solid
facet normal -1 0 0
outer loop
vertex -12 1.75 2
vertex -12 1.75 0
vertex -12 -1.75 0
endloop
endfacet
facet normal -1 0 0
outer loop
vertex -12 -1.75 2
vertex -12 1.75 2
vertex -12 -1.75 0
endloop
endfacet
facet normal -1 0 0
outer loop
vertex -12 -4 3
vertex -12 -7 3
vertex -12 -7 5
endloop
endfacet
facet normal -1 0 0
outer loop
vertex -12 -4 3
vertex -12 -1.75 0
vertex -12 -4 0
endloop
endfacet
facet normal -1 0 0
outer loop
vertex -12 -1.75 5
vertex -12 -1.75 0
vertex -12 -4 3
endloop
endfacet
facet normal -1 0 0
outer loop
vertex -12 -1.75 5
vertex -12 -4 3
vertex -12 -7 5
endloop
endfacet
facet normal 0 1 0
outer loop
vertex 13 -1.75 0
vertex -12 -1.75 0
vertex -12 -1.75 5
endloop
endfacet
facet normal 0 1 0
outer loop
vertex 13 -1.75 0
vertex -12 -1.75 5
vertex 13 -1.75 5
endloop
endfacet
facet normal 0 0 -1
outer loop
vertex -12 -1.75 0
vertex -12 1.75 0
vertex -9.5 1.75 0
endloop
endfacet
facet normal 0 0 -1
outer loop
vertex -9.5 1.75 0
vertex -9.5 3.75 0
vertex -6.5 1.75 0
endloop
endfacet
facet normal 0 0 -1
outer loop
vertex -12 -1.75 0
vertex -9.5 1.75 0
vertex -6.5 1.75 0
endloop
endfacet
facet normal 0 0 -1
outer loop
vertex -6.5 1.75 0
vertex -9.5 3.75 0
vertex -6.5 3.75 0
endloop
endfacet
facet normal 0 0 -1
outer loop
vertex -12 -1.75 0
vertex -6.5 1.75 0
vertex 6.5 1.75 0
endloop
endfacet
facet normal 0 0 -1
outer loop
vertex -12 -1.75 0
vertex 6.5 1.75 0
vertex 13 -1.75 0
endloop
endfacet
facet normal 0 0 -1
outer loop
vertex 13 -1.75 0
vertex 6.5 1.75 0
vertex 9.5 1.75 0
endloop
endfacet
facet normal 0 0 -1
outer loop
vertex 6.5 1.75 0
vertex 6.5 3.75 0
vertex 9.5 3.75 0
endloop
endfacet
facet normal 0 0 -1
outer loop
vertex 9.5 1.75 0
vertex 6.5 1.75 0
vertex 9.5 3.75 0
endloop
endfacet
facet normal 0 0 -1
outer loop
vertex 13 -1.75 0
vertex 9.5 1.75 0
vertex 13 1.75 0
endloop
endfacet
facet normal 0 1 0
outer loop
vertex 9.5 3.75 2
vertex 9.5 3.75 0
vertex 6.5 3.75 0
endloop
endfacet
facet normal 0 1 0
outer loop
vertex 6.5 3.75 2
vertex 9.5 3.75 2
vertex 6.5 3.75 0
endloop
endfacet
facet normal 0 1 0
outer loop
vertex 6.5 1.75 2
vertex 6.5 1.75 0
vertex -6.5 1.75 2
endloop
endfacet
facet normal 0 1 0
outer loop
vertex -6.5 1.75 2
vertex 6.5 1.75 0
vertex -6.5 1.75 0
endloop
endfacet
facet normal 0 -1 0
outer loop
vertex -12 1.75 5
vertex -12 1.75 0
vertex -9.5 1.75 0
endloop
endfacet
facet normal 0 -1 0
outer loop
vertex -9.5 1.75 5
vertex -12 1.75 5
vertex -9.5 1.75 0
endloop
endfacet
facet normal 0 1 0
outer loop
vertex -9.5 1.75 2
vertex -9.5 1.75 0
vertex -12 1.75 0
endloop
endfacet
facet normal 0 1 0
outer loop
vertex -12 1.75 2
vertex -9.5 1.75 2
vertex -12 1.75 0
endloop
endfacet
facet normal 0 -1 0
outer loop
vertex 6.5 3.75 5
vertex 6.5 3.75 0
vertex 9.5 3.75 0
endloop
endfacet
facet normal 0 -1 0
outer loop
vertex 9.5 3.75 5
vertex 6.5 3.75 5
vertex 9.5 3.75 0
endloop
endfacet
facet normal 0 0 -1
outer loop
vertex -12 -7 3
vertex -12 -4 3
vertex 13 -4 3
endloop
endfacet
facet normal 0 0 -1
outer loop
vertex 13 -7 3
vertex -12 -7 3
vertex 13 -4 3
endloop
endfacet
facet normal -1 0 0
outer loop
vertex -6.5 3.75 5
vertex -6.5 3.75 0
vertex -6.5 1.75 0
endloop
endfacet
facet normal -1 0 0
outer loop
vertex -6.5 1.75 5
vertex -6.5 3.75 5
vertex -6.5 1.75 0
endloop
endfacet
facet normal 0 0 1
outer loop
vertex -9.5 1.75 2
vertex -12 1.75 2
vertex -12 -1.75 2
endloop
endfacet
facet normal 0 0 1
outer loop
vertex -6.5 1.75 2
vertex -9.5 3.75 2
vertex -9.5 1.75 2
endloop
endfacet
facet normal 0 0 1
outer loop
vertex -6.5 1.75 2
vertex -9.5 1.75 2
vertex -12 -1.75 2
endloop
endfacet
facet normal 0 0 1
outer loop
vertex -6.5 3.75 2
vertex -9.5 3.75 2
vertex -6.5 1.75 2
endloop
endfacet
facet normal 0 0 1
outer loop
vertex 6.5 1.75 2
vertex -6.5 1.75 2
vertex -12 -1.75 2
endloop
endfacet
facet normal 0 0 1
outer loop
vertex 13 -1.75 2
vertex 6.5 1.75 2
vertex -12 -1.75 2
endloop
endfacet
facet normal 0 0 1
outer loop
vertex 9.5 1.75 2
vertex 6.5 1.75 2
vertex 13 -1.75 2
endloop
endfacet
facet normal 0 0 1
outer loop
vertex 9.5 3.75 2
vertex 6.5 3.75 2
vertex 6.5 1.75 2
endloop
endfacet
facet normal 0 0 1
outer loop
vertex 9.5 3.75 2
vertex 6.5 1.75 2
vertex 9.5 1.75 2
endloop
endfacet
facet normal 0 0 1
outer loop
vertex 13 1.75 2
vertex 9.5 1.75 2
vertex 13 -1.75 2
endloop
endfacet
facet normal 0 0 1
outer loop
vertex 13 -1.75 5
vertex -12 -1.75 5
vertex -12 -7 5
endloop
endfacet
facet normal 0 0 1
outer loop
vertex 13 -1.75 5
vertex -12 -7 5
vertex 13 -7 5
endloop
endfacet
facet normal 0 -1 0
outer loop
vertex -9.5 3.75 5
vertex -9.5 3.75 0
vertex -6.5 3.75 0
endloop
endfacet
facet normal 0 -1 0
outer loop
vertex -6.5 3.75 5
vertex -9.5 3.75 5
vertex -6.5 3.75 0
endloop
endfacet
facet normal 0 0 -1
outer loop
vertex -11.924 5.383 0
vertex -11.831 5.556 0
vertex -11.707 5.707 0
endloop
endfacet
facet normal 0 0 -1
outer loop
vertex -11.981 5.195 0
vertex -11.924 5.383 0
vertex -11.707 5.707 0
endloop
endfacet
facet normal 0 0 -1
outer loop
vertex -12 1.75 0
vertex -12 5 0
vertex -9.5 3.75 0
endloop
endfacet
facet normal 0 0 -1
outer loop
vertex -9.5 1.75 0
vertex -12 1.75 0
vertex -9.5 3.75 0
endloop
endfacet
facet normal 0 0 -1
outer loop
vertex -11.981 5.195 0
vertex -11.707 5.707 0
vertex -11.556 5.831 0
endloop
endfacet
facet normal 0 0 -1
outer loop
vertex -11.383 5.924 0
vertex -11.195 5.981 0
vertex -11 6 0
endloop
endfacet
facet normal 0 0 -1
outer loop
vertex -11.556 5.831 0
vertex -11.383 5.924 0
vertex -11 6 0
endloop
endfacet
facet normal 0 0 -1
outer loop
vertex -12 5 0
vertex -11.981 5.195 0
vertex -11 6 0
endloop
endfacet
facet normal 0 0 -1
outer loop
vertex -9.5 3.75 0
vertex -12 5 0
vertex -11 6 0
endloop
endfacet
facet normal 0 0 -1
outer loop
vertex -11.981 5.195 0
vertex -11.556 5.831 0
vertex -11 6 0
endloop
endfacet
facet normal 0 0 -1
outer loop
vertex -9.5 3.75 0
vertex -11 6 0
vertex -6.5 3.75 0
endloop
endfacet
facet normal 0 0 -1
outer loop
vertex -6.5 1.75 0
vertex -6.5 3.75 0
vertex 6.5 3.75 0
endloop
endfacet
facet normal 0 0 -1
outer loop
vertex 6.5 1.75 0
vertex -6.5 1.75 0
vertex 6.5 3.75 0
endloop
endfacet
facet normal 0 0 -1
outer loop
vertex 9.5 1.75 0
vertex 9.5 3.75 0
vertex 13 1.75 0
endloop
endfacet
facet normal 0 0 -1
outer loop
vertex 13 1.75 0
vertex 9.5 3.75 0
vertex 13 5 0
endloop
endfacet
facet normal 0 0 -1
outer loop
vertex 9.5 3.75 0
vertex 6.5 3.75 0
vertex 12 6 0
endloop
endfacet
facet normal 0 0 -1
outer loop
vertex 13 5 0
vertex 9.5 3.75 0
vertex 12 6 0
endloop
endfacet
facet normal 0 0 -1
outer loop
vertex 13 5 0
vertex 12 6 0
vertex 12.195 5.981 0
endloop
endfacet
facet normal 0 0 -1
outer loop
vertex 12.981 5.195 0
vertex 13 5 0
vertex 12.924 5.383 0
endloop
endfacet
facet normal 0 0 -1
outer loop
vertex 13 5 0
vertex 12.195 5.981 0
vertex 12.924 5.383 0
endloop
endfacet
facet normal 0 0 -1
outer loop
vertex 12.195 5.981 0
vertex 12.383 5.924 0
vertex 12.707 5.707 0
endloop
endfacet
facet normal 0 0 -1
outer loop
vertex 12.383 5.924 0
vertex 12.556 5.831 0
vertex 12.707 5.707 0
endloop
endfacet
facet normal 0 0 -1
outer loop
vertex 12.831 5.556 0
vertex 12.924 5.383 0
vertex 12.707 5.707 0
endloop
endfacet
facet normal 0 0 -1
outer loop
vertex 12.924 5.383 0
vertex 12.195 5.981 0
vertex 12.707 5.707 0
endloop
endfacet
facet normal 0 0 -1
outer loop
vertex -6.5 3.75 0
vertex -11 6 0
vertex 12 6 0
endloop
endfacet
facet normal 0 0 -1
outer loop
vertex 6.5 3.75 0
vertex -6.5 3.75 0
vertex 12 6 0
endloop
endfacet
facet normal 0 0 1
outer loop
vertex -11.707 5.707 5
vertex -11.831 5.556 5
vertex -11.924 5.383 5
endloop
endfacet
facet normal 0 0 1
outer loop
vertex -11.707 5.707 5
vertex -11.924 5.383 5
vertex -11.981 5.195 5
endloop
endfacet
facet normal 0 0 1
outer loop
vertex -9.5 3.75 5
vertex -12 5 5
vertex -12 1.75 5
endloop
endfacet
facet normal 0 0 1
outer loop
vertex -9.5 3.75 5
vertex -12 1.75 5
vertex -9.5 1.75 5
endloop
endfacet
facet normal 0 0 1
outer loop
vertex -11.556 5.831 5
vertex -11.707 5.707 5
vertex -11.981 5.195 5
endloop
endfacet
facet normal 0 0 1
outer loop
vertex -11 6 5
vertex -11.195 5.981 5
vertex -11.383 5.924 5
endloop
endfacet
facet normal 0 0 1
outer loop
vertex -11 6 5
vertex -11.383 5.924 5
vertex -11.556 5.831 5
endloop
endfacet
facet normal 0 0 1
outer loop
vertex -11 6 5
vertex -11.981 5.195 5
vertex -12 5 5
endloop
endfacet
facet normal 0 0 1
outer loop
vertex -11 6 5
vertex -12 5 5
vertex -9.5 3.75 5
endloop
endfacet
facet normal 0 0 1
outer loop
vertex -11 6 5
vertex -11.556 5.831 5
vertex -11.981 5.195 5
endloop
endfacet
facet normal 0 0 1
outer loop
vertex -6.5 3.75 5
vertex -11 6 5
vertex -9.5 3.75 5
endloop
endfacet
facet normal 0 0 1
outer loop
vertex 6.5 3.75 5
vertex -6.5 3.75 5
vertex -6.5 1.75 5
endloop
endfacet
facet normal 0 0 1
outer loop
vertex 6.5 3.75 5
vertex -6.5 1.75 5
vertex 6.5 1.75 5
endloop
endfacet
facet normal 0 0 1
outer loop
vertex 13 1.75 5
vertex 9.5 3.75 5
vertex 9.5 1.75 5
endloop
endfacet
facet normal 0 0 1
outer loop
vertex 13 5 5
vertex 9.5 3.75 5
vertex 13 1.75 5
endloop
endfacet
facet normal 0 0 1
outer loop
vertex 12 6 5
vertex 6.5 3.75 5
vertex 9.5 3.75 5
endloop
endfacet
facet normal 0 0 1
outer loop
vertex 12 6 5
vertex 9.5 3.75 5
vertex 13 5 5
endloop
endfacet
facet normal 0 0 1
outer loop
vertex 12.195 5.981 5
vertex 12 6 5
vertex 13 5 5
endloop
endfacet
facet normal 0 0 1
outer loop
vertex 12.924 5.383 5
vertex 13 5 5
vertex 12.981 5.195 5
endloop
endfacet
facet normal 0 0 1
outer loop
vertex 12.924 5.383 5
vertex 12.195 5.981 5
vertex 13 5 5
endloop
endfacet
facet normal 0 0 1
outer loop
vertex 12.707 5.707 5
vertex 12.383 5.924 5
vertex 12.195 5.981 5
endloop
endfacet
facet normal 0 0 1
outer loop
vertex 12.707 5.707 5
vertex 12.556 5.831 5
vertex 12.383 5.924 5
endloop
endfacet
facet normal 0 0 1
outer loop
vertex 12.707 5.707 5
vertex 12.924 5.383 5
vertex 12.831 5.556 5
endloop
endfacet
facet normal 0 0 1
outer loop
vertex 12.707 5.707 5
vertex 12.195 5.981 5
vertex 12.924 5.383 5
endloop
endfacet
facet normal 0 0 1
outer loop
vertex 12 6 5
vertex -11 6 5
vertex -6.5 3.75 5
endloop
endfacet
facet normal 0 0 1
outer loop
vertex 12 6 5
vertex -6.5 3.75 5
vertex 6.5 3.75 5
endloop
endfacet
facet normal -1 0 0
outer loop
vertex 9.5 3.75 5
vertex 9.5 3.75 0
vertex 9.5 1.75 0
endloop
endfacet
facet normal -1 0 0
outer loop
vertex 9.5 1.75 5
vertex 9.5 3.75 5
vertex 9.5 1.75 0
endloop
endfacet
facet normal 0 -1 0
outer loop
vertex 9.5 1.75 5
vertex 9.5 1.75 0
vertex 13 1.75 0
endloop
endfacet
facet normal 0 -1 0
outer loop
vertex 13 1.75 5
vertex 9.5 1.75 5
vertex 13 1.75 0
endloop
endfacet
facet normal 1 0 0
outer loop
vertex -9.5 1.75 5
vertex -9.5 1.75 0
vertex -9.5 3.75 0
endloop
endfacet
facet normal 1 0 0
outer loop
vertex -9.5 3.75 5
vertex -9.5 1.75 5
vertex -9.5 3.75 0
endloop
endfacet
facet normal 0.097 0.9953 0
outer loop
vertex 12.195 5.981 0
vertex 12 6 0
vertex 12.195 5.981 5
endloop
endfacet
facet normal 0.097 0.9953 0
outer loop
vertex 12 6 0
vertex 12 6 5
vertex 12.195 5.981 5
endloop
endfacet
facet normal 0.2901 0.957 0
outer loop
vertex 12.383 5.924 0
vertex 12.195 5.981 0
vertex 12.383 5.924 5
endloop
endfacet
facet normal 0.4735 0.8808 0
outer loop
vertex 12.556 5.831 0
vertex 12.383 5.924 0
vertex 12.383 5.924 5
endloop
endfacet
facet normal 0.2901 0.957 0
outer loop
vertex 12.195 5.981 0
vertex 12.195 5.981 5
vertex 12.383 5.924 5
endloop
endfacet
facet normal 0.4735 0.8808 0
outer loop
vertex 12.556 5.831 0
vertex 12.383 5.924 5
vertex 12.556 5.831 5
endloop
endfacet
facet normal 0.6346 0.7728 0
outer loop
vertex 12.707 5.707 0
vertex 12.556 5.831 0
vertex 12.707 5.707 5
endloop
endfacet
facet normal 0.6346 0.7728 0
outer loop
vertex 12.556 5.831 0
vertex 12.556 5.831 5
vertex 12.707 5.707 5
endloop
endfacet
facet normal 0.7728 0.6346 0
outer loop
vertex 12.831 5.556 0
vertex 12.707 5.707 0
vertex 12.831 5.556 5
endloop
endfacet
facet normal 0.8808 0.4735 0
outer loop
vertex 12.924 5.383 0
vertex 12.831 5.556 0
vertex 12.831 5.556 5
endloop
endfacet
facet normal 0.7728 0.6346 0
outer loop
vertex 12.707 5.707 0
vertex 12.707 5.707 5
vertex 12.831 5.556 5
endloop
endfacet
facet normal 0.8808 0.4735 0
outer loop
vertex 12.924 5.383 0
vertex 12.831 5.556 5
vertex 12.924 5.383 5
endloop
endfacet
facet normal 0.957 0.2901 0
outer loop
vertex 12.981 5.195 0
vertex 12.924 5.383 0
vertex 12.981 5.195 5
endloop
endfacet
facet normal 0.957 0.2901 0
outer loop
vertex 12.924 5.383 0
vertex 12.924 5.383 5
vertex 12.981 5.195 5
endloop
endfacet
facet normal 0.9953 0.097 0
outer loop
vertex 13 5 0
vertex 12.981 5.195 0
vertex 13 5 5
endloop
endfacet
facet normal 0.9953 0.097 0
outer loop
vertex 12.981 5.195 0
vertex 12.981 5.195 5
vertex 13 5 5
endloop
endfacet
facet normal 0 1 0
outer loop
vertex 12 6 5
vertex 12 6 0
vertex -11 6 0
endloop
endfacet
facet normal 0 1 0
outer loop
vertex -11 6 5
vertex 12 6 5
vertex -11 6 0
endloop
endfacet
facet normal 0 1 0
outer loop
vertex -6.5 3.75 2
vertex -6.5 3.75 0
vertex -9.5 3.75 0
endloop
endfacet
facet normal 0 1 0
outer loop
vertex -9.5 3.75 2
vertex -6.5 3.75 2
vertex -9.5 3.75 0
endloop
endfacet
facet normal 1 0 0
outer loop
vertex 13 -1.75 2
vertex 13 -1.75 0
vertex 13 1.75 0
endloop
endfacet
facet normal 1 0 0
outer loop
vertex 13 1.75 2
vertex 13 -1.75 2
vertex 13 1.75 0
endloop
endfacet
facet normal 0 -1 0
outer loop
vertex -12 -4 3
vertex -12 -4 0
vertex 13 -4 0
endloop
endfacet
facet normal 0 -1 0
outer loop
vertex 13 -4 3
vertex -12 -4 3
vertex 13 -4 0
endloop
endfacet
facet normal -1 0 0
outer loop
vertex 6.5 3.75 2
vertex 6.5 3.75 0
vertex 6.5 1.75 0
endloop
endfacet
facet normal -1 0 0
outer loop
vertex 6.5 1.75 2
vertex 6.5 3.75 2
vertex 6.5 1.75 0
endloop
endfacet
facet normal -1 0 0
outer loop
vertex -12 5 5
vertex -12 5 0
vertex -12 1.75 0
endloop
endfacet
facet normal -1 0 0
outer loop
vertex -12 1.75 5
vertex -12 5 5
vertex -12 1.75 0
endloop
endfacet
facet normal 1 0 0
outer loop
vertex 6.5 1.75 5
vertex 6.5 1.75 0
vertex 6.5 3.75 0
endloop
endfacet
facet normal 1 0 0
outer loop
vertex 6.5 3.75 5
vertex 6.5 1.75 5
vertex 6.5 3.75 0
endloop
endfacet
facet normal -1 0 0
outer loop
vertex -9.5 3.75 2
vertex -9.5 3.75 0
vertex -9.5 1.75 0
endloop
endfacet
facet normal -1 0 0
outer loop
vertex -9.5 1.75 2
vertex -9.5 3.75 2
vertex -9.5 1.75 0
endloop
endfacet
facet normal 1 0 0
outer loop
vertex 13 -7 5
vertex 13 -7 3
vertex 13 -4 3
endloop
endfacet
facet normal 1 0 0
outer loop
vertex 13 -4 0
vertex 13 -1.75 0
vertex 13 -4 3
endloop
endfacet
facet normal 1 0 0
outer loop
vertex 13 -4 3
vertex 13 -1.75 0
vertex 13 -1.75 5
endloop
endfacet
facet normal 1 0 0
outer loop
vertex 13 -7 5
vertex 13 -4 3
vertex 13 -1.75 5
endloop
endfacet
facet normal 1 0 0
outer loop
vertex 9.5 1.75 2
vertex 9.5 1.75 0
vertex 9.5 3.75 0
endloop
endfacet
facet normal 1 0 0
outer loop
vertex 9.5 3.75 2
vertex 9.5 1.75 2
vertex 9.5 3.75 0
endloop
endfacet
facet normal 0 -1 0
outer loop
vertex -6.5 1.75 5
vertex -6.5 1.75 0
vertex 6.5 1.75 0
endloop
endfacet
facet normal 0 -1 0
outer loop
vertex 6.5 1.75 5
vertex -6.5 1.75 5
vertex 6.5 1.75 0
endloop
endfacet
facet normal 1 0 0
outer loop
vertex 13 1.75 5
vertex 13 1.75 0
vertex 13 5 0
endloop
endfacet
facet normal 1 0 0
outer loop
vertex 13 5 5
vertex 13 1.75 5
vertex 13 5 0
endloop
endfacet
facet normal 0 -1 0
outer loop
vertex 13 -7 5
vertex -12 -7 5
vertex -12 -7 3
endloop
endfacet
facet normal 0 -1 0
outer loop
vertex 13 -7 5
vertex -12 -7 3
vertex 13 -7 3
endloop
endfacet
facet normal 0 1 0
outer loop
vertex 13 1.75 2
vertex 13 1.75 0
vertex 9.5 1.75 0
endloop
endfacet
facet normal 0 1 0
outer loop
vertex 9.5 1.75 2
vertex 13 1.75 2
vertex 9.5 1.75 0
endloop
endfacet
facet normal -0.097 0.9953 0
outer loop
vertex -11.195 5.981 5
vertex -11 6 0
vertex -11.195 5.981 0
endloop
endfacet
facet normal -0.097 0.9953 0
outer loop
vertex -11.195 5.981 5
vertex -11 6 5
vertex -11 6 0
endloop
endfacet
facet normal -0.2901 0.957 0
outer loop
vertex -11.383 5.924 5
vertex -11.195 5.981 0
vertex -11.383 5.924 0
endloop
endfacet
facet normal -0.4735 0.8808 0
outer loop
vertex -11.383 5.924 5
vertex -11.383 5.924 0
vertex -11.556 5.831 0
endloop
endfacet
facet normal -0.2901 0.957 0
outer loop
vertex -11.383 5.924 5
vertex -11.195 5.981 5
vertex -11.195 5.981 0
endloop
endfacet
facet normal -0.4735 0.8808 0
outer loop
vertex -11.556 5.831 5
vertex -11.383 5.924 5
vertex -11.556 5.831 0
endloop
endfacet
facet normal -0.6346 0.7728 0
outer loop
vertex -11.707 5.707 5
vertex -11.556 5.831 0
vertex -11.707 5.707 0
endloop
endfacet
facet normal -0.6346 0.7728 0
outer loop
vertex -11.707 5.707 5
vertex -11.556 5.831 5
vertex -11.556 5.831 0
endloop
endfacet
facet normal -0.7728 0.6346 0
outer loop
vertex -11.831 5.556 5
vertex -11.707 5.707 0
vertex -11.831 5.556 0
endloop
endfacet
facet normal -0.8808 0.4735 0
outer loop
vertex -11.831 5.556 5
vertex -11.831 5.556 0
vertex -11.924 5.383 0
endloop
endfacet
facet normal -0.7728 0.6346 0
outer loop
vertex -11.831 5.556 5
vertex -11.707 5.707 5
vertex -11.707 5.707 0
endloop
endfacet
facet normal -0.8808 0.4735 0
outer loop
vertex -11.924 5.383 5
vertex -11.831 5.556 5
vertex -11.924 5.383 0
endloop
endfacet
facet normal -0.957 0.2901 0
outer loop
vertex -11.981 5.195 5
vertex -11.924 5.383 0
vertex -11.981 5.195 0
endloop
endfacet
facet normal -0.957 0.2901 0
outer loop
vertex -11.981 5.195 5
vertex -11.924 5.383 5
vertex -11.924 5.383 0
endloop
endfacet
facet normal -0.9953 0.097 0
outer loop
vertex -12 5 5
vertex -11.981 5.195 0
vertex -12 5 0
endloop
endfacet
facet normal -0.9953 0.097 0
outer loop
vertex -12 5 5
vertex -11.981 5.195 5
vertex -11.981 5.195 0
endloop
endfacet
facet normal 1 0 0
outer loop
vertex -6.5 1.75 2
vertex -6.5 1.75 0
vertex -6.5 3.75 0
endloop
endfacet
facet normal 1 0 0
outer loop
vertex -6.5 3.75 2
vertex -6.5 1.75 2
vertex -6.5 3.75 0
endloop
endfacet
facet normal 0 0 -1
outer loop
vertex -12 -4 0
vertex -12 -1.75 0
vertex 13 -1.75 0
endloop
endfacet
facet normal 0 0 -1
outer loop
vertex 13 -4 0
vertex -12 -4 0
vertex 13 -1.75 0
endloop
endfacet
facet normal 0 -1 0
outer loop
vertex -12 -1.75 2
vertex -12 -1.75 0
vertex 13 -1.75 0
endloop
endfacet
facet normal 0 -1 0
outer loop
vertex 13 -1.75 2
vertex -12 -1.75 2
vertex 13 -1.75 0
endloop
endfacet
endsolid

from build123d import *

# Parameters (mm, degrees)
F0_W     = 25
F0_H     = 2.25
F1_DEPTH = 5
F2_DEPTH = 2
F3_R     = 1
F4_W     = 25
F4_H     = 2
F5_DEPTH = 3


with BuildPart() as f1:
    # F0 (on Top) → F1 (new body)
    with BuildSketch(Plane.XY):
        Polygon((13, 6), (-12, 6), (-12, 1.75), (-9.5, 1.75), (-9.5, 3.75), (-6.5, 3.75), (-6.5, 1.75), (6.5, 1.75), (6.5, 3.75), (9.5, 3.75), (9.5, 1.75), (13, 1.75), align=None)
        with Locations((0.5, -2.875)):
            Rectangle(F0_W, F0_H)
    extrude(amount=F1_DEPTH)

    # F3
    f3_edges = [f1.edges().sort_by_distance(p)[0] for p in [
        (13, 6, 2.5),
        (-12, 6, 2.5),
    ]]
    fillet(f3_edges, radius=F3_R)

    # F4 (on face) → F5 (join)
    with BuildSketch(Plane.XZ.offset(4)):
        with Locations((0.5, 4)):
            Rectangle(F4_W, F4_H)
    extrude(amount=F5_DEPTH)


with BuildPart() as f2:
    # F0 (on Top) → F2 (new body)
    with BuildSketch(Plane.XY):
        Polygon((-9.5, 1.75), (-12, 1.75), (-12, -1.75), (13, -1.75), (13, 1.75), (9.5, 1.75), (9.5, 3.75), (6.5, 3.75), (6.5, 1.75), (-6.5, 1.75), (-6.5, 3.75), (-9.5, 3.75), align=None)
    extrude(amount=F2_DEPTH)


solid = Compound([f1.part, f2.part])
